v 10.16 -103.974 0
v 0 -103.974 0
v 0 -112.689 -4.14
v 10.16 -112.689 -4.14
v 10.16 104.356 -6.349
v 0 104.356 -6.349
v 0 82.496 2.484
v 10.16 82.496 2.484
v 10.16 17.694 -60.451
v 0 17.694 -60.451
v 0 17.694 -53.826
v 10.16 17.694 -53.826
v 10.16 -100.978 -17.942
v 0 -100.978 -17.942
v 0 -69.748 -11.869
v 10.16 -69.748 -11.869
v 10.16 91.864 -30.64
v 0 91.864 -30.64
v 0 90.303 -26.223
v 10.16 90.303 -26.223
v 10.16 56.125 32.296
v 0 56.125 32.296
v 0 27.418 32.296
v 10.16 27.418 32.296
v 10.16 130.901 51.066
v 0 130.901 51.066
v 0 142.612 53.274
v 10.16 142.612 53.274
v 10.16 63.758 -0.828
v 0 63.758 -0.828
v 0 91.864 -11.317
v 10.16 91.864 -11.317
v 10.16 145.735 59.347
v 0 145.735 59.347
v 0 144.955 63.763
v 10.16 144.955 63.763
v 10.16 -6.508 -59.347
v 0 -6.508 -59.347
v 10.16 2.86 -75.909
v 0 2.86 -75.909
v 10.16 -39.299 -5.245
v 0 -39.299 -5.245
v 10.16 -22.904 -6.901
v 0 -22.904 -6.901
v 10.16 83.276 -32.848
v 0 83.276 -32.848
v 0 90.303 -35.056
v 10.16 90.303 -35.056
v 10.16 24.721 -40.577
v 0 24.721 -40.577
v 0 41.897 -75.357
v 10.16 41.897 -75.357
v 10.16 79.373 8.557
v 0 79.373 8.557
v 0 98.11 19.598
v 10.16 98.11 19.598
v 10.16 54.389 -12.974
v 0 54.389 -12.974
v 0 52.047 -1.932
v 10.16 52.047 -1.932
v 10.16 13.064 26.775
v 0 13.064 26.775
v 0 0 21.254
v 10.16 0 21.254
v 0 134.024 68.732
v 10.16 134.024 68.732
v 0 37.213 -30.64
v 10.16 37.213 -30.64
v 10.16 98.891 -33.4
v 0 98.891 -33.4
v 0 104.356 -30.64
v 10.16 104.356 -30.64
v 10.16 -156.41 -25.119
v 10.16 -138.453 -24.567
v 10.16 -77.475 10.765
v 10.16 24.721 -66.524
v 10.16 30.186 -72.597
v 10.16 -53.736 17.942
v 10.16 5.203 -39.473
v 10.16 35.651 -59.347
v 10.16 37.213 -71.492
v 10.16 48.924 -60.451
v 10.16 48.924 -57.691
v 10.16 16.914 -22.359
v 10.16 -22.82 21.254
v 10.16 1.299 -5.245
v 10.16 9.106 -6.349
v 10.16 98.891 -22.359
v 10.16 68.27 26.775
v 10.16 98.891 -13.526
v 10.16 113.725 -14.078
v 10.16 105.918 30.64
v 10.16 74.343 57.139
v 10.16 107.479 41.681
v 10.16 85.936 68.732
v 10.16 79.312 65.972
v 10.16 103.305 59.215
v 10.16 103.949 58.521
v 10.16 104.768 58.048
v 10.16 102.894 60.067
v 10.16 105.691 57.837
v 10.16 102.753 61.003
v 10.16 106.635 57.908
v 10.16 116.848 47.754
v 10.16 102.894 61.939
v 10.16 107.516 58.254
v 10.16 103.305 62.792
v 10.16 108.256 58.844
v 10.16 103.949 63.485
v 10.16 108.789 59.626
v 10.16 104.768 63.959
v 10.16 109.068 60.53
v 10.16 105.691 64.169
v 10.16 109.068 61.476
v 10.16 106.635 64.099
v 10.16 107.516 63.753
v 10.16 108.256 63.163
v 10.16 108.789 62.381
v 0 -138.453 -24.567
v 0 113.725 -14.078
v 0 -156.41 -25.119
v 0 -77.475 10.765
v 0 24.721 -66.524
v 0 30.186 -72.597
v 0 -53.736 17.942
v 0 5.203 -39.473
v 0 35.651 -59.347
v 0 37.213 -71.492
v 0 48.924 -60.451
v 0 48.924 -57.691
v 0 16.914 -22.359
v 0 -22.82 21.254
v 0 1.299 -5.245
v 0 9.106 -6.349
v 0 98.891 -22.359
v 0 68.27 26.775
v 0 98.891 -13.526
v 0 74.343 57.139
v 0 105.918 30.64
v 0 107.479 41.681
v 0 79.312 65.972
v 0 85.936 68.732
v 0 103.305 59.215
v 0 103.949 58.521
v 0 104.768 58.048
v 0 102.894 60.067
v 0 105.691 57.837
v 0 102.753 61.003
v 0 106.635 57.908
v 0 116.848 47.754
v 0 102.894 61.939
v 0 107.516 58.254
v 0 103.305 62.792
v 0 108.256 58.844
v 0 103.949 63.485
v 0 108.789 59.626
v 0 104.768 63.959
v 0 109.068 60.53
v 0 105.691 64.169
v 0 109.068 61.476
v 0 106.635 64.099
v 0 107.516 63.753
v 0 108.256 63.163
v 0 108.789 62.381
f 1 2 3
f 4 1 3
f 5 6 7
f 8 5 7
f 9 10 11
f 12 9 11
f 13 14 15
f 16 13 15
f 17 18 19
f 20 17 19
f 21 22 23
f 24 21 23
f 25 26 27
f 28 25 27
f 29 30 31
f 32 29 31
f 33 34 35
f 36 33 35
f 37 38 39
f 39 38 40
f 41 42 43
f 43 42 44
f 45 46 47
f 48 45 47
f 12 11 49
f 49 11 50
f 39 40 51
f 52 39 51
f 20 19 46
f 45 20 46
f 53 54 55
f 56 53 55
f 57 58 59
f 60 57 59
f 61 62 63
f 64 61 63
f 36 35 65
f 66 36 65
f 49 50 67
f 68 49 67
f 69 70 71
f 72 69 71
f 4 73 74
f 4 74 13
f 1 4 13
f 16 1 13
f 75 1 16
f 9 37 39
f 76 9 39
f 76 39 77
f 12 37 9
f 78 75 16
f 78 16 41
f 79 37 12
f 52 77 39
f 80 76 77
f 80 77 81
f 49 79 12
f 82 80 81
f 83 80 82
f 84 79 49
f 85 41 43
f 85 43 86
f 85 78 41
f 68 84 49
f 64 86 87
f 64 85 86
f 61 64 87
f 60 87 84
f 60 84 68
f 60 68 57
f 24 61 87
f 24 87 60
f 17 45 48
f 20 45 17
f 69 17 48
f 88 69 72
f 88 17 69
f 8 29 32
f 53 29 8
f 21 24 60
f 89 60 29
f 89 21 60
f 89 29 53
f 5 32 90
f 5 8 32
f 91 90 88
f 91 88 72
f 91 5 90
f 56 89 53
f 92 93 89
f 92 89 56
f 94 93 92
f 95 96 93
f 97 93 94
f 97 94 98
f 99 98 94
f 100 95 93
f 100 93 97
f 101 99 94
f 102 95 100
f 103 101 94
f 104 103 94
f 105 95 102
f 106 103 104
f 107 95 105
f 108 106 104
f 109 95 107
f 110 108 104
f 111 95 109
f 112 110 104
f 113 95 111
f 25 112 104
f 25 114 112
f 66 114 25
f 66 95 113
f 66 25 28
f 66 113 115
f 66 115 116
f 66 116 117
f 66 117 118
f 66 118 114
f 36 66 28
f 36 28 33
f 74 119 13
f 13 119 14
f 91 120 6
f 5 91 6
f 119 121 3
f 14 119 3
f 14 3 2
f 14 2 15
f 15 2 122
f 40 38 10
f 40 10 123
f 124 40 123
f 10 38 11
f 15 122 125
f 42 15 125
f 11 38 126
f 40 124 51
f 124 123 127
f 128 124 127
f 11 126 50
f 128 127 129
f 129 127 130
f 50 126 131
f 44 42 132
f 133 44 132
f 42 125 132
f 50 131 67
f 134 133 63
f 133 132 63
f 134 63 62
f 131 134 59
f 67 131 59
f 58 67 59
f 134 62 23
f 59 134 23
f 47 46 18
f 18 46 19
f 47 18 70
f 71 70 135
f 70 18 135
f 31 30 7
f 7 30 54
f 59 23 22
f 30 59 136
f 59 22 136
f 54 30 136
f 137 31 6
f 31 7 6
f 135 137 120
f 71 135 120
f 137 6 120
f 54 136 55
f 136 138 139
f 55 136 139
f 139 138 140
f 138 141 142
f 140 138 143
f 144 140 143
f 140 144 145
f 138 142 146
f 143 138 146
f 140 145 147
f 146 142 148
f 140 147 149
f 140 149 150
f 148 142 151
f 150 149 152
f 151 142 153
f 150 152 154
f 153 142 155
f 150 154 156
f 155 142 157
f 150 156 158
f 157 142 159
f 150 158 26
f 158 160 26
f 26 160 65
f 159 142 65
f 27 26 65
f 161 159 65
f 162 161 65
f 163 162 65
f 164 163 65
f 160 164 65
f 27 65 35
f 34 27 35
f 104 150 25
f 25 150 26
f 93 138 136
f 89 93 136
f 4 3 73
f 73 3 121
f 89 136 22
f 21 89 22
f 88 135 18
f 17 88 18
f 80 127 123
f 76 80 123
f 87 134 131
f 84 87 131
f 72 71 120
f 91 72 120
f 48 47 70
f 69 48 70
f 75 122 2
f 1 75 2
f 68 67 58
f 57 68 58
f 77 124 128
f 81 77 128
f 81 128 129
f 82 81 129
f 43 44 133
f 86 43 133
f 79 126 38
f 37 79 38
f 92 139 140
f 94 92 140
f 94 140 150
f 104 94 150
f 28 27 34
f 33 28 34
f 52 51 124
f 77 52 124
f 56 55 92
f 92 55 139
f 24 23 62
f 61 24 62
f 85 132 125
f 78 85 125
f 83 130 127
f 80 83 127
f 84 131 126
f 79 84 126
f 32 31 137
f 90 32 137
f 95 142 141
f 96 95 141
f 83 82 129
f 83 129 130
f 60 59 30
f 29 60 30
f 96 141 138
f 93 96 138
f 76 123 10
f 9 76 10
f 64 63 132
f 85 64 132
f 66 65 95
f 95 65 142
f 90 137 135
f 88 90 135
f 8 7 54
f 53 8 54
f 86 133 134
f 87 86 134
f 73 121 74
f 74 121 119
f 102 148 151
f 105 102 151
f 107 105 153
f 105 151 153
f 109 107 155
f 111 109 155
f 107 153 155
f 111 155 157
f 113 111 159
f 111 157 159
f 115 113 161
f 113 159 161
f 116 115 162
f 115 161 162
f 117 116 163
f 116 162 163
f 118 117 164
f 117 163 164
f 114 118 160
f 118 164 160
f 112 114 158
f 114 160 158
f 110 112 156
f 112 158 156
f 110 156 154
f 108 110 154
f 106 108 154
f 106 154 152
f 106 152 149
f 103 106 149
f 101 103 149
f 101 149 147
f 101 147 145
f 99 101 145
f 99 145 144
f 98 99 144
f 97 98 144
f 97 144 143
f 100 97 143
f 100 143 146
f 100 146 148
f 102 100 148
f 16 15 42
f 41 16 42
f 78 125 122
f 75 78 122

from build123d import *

# Parameters (mm, degrees)
F1_DEPTH = 10.16
F3_D     = 6.35


with BuildPart() as f1:
    # F0 (on Right) → F1 (new body)
    with BuildSketch(Plane.YZ):
        Polygon((-77.474721, 10.765259), (-103.973828, 0), (-112.688757, -4.140489), (-156.410038, -25.118949), (-138.453096, -24.566885), (-100.977682, -17.942108), (-69.748186, -11.869396), (-39.299428, -5.244619), (-22.903949, -6.900813), (1.298919, -5.244619), (9.106293, -6.348748), (16.913667, -22.358626), (5.202606, -39.472636), (-6.508455, -59.346966), (2.860397, -75.908907), (41.89726, -75.356841), (30.186206, -72.59652), (37.212841, -71.492389), (48.923902, -60.451094), (48.923902, -57.690769), (35.651371, -59.346966), (24.721041, -66.523813), (17.694414, -60.451094), (17.694414, -53.826321), (24.721041, -40.576763), (37.212841, -30.639596), (54.389074, -12.973526), (52.046858, -1.93223), (63.757919, -0.828101), (91.864459, -11.317331), (98.891109, -13.52559), (98.891109, -22.358626), (91.864459, -30.639596), (90.302989, -26.22308), (83.276354, -32.847855), (90.302989, -35.056114), (98.891109, -33.399921), (104.356274, -30.639596), (113.725118, -14.077655), (104.356274, -6.348748), (82.495622, 2.484288), (79.372667, 8.557), (98.110363, 19.598294), (105.917737, 30.639591), (107.47923, 41.680887), (116.848074, 47.753599), (130.901337, 51.065989), (142.612413, 53.274248), (145.735353, 59.346959), (144.954622, 63.763477), (134.024292, 68.73206), (85.936449, 68.73206), (79.311676, 65.971732), (74.343085, 57.1387), (68.270378, 26.775137), (56.124948, 32.295786), (39.010942, 32.295786), (27.417587, 32.295786), (13.063898, 26.775137), (0, 21.254489), (-22.820309, 21.254489), (-53.735938, 17.942103), align=None)
    extrude(amount=F1_DEPTH)

    # F3 (through all)
    with Locations(Plane.YZ.offset(10.16)):
        with Locations((105.92816, 61.003152)):
            Hole(F3_D / 2)


solid = f1.part
